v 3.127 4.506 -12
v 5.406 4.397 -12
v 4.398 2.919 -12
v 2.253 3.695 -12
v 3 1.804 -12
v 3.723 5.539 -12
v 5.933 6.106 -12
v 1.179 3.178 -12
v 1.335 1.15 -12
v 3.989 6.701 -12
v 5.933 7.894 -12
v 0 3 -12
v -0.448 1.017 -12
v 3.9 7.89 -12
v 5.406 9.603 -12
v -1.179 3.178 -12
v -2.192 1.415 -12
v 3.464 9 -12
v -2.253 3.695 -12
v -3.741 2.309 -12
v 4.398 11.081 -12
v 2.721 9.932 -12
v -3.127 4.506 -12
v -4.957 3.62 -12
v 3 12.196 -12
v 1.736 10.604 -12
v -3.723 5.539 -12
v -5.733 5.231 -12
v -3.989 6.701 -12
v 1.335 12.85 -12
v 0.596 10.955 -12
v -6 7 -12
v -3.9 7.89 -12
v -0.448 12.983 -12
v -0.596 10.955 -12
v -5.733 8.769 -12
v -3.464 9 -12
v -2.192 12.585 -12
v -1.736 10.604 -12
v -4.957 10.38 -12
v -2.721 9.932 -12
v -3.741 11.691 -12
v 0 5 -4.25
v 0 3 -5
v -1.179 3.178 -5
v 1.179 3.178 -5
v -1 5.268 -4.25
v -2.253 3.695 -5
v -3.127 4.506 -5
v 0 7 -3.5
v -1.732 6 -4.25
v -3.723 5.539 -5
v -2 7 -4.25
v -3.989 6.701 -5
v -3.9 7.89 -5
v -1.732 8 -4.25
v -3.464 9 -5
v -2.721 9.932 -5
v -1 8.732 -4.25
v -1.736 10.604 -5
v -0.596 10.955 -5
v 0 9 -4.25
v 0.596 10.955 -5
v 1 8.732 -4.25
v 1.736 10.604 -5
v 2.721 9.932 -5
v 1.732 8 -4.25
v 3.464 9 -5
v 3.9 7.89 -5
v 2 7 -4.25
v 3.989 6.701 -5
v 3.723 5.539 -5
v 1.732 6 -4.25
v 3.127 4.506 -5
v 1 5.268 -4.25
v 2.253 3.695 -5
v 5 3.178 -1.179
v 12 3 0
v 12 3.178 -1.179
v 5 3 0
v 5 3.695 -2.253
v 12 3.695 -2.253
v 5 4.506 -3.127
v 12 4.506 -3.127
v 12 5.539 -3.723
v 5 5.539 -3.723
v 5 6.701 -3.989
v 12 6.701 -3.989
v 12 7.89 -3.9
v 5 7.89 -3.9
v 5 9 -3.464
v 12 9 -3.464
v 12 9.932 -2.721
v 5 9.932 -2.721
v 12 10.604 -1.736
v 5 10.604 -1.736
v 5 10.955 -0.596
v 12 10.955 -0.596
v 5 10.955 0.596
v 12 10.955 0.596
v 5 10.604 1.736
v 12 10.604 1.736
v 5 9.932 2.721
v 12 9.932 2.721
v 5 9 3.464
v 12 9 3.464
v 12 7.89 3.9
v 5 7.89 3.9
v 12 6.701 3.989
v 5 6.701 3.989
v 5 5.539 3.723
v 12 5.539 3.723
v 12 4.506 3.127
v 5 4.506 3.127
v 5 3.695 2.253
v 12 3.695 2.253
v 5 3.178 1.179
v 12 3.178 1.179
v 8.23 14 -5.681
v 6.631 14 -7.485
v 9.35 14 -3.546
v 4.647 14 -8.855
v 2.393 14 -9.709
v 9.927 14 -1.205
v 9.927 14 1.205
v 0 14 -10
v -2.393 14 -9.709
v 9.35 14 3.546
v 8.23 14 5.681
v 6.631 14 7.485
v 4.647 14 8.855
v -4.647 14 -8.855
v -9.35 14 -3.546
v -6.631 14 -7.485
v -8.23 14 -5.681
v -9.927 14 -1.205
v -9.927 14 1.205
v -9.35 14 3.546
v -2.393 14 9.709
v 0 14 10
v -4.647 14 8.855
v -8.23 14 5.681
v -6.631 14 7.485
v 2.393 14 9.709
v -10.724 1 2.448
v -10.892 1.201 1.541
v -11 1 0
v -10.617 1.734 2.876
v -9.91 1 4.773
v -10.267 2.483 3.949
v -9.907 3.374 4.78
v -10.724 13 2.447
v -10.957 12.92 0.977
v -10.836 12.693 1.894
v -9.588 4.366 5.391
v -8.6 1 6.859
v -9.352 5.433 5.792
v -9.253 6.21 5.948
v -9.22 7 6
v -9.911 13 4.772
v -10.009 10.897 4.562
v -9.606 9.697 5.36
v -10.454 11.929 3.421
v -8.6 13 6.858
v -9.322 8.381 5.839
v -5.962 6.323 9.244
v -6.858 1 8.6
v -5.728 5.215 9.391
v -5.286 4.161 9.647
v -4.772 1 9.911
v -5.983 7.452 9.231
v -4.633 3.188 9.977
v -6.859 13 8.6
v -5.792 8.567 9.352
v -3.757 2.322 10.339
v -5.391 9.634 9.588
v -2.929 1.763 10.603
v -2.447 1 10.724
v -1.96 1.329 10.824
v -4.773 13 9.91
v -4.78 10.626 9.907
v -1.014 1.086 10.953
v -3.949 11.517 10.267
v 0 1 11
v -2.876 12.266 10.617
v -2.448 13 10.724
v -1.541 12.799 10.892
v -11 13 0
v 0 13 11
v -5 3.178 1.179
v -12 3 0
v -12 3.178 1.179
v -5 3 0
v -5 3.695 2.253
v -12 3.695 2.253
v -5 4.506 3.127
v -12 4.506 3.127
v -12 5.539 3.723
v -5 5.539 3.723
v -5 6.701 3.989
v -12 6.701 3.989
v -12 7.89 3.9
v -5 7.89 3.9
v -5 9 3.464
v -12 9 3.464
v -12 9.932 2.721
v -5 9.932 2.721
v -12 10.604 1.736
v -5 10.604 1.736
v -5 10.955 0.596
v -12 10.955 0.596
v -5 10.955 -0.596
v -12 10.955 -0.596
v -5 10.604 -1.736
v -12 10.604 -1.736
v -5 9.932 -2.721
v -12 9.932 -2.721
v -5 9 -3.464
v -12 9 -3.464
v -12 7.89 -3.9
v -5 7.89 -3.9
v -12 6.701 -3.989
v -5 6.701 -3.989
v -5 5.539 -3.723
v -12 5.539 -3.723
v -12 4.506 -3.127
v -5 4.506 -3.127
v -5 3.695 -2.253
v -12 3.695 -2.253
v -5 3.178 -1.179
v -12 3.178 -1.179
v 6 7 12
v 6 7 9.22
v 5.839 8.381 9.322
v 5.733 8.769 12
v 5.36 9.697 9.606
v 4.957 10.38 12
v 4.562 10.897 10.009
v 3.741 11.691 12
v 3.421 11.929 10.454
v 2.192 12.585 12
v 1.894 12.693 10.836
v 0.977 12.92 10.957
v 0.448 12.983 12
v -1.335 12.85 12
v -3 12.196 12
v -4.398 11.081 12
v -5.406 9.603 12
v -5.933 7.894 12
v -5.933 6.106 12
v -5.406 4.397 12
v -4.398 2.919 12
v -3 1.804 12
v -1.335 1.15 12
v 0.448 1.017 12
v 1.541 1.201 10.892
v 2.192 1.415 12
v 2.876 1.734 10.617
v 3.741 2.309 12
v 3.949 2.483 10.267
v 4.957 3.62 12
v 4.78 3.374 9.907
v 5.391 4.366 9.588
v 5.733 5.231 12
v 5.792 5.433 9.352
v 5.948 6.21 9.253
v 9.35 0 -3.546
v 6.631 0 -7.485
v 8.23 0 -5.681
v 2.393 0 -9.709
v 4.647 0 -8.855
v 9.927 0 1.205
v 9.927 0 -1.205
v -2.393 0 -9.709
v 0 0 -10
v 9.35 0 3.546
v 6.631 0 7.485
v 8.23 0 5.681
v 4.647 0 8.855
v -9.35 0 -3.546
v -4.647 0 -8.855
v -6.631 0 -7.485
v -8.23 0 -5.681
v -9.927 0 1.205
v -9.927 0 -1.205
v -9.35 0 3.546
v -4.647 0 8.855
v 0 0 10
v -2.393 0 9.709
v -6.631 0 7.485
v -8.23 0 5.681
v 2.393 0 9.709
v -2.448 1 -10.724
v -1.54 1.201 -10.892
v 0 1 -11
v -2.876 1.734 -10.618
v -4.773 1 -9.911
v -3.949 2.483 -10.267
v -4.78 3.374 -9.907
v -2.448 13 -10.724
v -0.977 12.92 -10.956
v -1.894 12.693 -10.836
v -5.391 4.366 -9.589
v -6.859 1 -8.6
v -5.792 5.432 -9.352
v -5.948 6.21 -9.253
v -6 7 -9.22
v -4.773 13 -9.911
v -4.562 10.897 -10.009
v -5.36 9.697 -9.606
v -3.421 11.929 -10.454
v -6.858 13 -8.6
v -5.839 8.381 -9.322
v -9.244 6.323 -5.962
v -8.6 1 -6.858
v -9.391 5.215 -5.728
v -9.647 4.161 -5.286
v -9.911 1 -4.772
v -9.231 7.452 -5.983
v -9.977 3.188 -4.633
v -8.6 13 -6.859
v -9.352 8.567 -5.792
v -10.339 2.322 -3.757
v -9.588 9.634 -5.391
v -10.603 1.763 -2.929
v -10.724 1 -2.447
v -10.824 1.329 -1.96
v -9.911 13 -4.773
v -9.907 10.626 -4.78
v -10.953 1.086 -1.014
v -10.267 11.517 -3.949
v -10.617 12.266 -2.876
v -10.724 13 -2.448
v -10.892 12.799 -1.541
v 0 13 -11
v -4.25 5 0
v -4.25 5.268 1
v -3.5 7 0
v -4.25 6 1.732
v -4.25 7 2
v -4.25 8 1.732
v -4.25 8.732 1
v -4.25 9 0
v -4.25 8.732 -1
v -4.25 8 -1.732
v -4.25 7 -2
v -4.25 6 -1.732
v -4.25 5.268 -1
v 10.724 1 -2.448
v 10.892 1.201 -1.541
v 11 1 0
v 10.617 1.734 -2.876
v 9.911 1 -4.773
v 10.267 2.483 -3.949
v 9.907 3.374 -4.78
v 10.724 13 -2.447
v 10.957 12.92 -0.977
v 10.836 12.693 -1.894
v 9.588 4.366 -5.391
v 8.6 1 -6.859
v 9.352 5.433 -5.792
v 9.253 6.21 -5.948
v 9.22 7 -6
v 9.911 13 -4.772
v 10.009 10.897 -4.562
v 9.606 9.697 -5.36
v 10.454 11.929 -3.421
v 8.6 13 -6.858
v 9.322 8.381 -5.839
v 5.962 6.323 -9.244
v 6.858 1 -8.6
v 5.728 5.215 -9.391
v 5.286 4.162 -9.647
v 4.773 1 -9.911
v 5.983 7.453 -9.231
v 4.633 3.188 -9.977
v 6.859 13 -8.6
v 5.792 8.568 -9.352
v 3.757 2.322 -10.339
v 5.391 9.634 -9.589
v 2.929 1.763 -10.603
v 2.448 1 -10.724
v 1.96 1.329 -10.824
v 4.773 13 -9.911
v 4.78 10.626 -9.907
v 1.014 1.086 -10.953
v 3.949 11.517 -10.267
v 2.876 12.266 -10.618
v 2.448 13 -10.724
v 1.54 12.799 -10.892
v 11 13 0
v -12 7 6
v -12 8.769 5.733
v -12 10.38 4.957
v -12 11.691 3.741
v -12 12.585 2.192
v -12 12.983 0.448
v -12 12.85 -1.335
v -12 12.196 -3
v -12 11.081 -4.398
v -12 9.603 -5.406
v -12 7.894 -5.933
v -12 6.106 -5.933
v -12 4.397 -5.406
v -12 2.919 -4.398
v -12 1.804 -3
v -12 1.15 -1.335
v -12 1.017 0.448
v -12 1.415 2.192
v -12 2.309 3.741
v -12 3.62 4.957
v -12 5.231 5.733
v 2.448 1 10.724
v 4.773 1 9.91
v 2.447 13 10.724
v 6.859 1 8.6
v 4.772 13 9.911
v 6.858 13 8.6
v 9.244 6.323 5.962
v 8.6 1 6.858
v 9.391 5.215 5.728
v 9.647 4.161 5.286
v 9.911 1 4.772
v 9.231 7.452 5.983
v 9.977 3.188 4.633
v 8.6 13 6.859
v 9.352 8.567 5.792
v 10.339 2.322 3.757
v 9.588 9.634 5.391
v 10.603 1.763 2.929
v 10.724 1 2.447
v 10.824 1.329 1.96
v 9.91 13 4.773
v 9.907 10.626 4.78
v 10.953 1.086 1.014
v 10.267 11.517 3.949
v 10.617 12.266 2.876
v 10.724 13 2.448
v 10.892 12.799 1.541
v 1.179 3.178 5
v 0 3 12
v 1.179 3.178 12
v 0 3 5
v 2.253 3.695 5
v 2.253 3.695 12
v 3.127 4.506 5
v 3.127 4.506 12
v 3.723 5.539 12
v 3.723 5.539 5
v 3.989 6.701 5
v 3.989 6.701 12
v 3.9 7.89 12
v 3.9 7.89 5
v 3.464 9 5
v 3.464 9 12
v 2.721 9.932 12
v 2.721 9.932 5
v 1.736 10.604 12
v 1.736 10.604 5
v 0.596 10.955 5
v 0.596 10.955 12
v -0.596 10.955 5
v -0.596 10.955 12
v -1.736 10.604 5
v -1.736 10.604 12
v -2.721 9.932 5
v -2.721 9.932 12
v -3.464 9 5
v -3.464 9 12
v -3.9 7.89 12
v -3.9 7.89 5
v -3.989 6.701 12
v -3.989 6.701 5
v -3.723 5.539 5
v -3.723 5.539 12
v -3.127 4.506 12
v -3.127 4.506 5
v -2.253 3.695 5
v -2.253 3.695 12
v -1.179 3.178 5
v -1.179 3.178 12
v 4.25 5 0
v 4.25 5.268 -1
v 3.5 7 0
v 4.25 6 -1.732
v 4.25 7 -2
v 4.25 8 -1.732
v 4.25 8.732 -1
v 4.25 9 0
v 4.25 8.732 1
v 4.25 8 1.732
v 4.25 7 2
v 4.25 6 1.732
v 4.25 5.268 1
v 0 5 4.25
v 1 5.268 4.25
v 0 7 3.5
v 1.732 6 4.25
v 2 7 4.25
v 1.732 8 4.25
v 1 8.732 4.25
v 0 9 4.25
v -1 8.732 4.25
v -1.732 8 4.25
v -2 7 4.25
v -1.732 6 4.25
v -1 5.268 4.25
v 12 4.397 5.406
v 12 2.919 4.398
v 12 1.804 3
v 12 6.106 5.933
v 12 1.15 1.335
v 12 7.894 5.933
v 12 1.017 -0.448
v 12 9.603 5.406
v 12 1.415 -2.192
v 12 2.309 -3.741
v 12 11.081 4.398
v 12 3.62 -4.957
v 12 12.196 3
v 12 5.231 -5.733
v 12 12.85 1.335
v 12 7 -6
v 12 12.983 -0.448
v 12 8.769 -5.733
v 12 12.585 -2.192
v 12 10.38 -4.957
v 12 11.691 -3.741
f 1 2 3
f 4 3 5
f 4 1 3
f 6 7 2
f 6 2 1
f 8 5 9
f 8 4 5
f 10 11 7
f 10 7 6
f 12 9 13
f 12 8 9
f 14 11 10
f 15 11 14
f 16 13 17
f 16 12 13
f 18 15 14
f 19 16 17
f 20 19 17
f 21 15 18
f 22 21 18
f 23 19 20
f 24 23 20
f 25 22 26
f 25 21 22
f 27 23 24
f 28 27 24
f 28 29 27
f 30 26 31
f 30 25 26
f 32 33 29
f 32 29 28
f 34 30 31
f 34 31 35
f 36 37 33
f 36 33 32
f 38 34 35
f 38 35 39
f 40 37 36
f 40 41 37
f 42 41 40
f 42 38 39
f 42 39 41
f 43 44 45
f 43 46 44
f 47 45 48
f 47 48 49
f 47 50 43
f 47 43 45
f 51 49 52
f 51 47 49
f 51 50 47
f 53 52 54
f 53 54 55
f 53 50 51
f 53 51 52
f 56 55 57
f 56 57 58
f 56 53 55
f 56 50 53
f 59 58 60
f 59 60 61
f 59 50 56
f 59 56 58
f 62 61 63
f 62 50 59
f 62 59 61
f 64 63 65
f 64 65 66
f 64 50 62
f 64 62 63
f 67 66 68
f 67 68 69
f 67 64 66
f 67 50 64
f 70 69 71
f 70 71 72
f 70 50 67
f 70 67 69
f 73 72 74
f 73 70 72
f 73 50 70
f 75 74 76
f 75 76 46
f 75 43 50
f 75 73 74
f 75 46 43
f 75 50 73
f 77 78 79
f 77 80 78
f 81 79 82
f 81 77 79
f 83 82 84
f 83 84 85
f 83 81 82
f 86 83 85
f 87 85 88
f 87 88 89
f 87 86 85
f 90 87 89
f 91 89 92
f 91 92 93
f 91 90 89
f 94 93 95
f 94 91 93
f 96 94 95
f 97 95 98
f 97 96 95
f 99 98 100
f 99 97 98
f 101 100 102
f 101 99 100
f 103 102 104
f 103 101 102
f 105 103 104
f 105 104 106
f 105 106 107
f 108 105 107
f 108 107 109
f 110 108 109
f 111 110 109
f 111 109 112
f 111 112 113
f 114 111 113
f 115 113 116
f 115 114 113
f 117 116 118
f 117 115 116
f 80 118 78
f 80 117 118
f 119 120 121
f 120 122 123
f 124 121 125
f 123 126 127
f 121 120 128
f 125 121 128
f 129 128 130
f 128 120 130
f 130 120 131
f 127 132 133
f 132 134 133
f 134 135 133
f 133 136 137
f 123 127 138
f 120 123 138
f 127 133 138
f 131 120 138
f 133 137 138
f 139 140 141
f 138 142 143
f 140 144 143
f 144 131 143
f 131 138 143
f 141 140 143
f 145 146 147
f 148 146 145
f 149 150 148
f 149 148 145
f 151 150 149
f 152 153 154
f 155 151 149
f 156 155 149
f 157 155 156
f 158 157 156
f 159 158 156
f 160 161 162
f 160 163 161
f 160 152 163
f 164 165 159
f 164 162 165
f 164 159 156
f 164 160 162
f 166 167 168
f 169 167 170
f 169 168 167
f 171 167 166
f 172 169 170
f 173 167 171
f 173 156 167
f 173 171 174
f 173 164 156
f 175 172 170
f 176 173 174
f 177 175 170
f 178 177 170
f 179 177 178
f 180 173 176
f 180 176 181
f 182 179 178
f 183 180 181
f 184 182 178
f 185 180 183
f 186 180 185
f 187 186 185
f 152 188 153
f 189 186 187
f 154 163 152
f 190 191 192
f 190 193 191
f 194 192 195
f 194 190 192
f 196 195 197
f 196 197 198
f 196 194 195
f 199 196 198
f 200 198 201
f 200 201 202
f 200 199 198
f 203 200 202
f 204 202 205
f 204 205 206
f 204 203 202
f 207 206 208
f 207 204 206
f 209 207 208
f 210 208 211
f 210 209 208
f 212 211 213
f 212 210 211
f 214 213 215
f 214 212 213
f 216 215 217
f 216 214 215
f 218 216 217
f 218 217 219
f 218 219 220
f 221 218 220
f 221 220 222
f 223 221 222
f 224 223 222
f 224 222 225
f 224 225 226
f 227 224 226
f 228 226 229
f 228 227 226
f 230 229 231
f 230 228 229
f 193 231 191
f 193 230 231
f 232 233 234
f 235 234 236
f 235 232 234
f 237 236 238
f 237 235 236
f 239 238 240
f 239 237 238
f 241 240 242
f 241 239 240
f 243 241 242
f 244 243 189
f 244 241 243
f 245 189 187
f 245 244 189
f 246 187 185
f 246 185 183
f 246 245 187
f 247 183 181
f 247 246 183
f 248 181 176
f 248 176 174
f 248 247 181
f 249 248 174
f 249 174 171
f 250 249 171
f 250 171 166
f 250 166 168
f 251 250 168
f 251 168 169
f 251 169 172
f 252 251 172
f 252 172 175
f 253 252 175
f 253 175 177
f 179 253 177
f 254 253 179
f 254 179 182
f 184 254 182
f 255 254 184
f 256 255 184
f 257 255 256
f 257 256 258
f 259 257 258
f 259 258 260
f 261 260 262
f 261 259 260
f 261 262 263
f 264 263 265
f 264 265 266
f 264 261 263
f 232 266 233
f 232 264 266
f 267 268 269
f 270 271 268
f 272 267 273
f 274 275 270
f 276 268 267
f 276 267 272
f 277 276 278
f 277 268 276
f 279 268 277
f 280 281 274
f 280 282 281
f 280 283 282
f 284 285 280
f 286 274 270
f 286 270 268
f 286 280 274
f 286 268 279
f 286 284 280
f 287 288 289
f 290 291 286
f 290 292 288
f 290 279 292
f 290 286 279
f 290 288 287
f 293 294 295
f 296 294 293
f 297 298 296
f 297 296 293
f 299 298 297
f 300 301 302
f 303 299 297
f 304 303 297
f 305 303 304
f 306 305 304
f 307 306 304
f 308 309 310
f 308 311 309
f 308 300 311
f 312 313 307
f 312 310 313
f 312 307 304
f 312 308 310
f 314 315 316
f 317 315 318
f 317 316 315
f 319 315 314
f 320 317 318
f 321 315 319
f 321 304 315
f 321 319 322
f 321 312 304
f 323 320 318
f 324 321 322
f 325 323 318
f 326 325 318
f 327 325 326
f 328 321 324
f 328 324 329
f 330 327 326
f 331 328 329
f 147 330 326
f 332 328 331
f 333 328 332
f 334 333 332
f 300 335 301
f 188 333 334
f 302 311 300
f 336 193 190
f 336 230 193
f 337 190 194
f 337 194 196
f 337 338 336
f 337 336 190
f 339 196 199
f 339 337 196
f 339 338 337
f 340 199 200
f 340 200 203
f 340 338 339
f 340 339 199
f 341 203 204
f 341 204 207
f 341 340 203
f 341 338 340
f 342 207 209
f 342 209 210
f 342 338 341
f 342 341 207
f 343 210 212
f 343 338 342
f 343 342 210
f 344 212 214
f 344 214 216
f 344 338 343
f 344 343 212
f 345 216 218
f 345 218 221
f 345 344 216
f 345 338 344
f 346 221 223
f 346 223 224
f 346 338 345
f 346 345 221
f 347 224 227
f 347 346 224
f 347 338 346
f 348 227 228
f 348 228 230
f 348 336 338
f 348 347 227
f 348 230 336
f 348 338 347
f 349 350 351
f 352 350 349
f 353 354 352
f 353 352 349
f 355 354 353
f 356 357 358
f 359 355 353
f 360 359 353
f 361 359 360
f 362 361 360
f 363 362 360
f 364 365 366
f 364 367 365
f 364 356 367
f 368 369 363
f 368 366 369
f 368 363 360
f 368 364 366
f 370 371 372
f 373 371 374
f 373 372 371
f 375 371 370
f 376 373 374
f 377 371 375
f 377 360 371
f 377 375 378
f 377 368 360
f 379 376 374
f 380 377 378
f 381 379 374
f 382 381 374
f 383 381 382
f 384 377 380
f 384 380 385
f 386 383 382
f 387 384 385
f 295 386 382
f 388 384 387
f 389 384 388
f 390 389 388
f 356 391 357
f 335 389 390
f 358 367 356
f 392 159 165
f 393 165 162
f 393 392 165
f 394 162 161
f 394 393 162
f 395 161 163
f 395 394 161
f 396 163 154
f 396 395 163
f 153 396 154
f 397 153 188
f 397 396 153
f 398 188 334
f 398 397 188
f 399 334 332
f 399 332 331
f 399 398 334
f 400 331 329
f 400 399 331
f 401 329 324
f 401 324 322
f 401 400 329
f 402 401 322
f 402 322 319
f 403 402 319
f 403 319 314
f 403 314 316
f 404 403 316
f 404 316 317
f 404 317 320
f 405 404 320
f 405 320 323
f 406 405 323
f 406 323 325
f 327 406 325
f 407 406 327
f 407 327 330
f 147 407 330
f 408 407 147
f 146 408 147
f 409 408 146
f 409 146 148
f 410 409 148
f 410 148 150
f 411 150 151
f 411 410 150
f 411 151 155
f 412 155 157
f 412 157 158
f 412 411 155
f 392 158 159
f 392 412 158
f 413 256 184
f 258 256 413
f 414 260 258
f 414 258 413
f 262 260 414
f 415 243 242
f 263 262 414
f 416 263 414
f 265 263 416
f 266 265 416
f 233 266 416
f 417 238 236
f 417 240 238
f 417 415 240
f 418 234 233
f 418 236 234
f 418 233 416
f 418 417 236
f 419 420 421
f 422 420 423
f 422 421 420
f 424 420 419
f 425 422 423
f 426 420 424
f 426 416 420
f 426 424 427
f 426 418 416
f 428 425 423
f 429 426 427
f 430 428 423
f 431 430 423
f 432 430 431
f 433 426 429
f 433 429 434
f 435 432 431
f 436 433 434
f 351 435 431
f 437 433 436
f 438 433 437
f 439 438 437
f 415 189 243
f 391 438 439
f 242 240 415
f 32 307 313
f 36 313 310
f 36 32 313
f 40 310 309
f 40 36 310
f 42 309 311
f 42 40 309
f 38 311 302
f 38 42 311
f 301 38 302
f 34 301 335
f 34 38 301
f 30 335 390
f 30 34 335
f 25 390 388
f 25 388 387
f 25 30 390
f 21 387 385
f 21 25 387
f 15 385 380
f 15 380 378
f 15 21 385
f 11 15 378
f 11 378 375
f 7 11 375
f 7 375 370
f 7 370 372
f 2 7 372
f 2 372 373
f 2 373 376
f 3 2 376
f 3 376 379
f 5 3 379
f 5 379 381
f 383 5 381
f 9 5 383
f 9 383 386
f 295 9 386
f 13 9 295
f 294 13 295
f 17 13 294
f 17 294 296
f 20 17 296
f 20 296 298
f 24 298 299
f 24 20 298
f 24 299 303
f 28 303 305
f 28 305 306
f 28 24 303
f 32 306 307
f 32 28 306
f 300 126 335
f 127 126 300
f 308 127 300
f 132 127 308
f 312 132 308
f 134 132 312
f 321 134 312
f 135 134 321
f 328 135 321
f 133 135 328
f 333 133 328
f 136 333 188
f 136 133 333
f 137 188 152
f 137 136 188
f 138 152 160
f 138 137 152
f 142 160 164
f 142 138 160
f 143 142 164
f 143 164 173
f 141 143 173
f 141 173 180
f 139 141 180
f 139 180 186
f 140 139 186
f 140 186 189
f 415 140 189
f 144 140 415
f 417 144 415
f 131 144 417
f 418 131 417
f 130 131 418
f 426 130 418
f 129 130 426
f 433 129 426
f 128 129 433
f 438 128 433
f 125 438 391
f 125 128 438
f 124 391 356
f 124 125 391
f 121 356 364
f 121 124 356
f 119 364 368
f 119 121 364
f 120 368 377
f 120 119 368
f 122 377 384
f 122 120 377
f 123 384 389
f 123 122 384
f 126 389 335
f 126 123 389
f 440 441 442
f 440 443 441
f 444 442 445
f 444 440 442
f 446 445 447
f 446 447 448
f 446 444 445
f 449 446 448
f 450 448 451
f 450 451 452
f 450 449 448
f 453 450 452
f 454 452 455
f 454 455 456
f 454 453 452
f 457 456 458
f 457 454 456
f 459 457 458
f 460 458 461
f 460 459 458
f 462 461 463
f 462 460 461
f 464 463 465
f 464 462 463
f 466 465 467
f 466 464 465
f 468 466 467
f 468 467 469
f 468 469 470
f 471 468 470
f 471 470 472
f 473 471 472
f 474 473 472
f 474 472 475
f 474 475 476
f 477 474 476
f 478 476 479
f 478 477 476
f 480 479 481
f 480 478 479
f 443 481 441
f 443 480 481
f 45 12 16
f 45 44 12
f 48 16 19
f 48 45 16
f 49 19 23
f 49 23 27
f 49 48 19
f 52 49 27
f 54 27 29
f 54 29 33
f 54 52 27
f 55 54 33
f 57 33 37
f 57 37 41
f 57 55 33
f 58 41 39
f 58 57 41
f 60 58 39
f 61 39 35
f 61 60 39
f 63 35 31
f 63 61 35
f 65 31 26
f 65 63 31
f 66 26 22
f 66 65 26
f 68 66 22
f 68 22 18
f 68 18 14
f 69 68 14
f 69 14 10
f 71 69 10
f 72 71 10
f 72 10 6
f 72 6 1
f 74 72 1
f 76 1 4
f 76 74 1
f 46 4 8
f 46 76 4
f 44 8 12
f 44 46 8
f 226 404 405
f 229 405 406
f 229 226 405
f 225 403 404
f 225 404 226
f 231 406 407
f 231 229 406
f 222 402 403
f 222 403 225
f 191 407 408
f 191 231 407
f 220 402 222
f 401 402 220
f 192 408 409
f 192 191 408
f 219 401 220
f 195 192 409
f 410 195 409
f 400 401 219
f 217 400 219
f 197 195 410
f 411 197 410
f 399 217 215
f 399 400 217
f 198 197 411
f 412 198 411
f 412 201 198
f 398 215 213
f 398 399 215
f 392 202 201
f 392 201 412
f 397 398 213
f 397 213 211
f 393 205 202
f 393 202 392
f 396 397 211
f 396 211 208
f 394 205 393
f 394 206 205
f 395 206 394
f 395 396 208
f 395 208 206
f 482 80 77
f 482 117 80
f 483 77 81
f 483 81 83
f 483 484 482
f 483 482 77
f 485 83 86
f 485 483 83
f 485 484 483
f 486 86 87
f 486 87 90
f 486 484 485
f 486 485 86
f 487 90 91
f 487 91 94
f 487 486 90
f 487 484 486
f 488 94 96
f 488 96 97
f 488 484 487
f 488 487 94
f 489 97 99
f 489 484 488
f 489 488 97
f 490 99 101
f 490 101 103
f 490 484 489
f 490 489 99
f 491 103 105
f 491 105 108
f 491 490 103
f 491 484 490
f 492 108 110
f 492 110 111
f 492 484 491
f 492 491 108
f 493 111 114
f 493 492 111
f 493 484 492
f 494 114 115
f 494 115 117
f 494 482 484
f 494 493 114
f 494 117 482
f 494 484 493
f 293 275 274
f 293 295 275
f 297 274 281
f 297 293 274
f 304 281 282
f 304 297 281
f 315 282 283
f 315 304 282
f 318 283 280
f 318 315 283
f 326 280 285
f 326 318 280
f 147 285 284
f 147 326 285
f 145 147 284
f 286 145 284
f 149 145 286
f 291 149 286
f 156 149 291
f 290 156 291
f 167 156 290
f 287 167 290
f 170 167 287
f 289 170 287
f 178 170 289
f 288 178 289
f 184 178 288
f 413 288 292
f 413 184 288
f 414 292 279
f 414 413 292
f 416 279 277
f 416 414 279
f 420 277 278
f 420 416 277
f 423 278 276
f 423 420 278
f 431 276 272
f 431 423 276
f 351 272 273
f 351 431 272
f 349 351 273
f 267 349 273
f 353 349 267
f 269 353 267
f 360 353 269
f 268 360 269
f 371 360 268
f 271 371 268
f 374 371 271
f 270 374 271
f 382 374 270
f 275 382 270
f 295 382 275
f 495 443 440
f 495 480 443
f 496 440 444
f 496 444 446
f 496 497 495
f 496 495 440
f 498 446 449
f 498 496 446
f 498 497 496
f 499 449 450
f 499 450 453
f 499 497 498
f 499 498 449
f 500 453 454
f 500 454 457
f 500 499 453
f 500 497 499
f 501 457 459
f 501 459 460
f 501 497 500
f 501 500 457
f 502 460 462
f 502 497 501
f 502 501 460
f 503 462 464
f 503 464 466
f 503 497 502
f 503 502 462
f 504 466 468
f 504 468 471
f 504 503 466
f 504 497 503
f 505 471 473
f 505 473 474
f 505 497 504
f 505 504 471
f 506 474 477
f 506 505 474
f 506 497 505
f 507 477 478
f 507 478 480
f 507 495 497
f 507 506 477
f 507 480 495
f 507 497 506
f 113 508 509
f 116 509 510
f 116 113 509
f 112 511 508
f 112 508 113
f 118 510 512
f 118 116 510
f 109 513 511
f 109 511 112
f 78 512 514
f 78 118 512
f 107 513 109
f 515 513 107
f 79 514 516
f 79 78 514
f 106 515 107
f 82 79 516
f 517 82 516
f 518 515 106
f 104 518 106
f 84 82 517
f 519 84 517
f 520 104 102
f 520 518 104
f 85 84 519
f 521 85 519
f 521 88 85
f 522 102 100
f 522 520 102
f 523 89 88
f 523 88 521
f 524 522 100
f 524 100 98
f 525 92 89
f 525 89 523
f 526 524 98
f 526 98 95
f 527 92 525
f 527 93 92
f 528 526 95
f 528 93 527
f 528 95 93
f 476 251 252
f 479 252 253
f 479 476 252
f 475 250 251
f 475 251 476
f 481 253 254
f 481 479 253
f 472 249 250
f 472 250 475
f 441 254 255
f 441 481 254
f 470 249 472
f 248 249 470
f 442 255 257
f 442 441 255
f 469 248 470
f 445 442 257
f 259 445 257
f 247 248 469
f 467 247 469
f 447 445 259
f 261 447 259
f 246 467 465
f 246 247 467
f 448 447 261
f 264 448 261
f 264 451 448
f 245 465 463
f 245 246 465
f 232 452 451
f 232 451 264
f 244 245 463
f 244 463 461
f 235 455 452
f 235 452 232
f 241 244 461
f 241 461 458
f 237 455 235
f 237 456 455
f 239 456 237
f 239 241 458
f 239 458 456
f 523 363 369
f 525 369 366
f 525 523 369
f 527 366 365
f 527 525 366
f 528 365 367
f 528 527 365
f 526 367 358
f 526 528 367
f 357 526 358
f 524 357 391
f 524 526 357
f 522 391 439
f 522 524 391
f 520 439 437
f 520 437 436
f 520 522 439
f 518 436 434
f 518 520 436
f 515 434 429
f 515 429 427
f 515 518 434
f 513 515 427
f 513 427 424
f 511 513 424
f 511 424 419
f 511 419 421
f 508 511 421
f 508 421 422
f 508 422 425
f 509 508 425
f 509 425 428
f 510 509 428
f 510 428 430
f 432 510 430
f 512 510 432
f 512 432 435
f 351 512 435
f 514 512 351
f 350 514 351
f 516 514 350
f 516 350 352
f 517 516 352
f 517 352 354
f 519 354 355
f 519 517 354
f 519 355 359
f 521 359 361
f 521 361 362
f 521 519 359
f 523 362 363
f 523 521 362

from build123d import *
from build123d.topology import SkipClean

# Parameters (mm, degrees)
CROQUIS1_W                   = 11
CROQUIS1_H                   = 14
CHAFL_N1_SIZE                = 1
SALIENTE_EXTRUIR1_REACH      = 31.086
SALIENTE_EXTRUIR1_END_RADIUS = 11
CROQUIS2_R                   = 6
MATRIZC1_COUNT               = 4
MATRIZC4_COUNT               = 4


with BuildPart() as part:
    # Croquis1 → Revolución1 (revolve)
    with BuildSketch(Plane(origin=(0, 0, 0), x_dir=(0, 0, -1), z_dir=(1, 0, 0))):
        with Locations((5.5, 7)):
            Rectangle(CROQUIS1_W, CROQUIS1_H)
    revolve(axis=Axis((0, 0, 0), (0, 1, 0)))

    # Chaflán1
    chafl_n1_edges = [part.edges().sort_by_distance(p)[0] for p in [
        (0, 0, 11),
        (0, 14, 11),
    ]]
    chamfer(chafl_n1_edges, length=CHAFL_N1_SIZE)

    # Saliente-Extruir1: up to this cylinder (the profile starts outside it)
    with SkipClean():  # the faces are left unmerged after this step: merging them gives an invalid solid
        saliente_extruir1_end = Plane(origin=(0, 7, 0), z_dir=(0, -1, 0)) * Cylinder(SALIENTE_EXTRUIR1_END_RADIUS, 85.172, mode=Mode.PRIVATE)
        # Croquis2 → Saliente-Extruir1 (add, up to the surface)
        with BuildSketch(Plane.XY.offset(12), mode=Mode.PRIVATE) as saliente_extruir1_sk1:
            with Locations((0, 7)):
                Circle(CROQUIS2_R)
        saliente_extruir1_tool1 = extrude(saliente_extruir1_sk1.sketch, amount=-SALIENTE_EXTRUIR1_REACH, mode=Mode.PRIVATE) - saliente_extruir1_end
        saliente_extruir1 = saliente_extruir1_tool1.solids().sort_by_distance((0, 7, 12))[0]
        add(saliente_extruir1)

    # MatrizC1: Saliente-Extruir1 ×4 about axis
    matrizc1_axis = Axis((0, 0, 0), (0, 1, 0))
    for i in range(1, MATRIZC1_COUNT):
        add(saliente_extruir1.rotate(matrizc1_axis, i * 360 / MATRIZC1_COUNT))

    # Croquis4 → Cortar-Revolución1 (revolve, cut)
    with BuildSketch(Plane.XY):
        Polygon((3.5, 7), (12, 7), (12, 3), (5, 3), align=None)
    cortar_revoluci_n1 = revolve(axis=Axis((3.5, 7, 0), (1, 0, 0)), mode=Mode.SUBTRACT)

    # MatrizC4: Cortar-Revolución1 ×4 about axis
    matrizc4_axis = Axis((0, 14, 0), (0, 1, 0))
    for i in range(1, MATRIZC4_COUNT):
        add(cortar_revoluci_n1.rotate(matrizc4_axis, i * 360 / MATRIZC4_COUNT), mode=Mode.SUBTRACT)


solid = part.part
